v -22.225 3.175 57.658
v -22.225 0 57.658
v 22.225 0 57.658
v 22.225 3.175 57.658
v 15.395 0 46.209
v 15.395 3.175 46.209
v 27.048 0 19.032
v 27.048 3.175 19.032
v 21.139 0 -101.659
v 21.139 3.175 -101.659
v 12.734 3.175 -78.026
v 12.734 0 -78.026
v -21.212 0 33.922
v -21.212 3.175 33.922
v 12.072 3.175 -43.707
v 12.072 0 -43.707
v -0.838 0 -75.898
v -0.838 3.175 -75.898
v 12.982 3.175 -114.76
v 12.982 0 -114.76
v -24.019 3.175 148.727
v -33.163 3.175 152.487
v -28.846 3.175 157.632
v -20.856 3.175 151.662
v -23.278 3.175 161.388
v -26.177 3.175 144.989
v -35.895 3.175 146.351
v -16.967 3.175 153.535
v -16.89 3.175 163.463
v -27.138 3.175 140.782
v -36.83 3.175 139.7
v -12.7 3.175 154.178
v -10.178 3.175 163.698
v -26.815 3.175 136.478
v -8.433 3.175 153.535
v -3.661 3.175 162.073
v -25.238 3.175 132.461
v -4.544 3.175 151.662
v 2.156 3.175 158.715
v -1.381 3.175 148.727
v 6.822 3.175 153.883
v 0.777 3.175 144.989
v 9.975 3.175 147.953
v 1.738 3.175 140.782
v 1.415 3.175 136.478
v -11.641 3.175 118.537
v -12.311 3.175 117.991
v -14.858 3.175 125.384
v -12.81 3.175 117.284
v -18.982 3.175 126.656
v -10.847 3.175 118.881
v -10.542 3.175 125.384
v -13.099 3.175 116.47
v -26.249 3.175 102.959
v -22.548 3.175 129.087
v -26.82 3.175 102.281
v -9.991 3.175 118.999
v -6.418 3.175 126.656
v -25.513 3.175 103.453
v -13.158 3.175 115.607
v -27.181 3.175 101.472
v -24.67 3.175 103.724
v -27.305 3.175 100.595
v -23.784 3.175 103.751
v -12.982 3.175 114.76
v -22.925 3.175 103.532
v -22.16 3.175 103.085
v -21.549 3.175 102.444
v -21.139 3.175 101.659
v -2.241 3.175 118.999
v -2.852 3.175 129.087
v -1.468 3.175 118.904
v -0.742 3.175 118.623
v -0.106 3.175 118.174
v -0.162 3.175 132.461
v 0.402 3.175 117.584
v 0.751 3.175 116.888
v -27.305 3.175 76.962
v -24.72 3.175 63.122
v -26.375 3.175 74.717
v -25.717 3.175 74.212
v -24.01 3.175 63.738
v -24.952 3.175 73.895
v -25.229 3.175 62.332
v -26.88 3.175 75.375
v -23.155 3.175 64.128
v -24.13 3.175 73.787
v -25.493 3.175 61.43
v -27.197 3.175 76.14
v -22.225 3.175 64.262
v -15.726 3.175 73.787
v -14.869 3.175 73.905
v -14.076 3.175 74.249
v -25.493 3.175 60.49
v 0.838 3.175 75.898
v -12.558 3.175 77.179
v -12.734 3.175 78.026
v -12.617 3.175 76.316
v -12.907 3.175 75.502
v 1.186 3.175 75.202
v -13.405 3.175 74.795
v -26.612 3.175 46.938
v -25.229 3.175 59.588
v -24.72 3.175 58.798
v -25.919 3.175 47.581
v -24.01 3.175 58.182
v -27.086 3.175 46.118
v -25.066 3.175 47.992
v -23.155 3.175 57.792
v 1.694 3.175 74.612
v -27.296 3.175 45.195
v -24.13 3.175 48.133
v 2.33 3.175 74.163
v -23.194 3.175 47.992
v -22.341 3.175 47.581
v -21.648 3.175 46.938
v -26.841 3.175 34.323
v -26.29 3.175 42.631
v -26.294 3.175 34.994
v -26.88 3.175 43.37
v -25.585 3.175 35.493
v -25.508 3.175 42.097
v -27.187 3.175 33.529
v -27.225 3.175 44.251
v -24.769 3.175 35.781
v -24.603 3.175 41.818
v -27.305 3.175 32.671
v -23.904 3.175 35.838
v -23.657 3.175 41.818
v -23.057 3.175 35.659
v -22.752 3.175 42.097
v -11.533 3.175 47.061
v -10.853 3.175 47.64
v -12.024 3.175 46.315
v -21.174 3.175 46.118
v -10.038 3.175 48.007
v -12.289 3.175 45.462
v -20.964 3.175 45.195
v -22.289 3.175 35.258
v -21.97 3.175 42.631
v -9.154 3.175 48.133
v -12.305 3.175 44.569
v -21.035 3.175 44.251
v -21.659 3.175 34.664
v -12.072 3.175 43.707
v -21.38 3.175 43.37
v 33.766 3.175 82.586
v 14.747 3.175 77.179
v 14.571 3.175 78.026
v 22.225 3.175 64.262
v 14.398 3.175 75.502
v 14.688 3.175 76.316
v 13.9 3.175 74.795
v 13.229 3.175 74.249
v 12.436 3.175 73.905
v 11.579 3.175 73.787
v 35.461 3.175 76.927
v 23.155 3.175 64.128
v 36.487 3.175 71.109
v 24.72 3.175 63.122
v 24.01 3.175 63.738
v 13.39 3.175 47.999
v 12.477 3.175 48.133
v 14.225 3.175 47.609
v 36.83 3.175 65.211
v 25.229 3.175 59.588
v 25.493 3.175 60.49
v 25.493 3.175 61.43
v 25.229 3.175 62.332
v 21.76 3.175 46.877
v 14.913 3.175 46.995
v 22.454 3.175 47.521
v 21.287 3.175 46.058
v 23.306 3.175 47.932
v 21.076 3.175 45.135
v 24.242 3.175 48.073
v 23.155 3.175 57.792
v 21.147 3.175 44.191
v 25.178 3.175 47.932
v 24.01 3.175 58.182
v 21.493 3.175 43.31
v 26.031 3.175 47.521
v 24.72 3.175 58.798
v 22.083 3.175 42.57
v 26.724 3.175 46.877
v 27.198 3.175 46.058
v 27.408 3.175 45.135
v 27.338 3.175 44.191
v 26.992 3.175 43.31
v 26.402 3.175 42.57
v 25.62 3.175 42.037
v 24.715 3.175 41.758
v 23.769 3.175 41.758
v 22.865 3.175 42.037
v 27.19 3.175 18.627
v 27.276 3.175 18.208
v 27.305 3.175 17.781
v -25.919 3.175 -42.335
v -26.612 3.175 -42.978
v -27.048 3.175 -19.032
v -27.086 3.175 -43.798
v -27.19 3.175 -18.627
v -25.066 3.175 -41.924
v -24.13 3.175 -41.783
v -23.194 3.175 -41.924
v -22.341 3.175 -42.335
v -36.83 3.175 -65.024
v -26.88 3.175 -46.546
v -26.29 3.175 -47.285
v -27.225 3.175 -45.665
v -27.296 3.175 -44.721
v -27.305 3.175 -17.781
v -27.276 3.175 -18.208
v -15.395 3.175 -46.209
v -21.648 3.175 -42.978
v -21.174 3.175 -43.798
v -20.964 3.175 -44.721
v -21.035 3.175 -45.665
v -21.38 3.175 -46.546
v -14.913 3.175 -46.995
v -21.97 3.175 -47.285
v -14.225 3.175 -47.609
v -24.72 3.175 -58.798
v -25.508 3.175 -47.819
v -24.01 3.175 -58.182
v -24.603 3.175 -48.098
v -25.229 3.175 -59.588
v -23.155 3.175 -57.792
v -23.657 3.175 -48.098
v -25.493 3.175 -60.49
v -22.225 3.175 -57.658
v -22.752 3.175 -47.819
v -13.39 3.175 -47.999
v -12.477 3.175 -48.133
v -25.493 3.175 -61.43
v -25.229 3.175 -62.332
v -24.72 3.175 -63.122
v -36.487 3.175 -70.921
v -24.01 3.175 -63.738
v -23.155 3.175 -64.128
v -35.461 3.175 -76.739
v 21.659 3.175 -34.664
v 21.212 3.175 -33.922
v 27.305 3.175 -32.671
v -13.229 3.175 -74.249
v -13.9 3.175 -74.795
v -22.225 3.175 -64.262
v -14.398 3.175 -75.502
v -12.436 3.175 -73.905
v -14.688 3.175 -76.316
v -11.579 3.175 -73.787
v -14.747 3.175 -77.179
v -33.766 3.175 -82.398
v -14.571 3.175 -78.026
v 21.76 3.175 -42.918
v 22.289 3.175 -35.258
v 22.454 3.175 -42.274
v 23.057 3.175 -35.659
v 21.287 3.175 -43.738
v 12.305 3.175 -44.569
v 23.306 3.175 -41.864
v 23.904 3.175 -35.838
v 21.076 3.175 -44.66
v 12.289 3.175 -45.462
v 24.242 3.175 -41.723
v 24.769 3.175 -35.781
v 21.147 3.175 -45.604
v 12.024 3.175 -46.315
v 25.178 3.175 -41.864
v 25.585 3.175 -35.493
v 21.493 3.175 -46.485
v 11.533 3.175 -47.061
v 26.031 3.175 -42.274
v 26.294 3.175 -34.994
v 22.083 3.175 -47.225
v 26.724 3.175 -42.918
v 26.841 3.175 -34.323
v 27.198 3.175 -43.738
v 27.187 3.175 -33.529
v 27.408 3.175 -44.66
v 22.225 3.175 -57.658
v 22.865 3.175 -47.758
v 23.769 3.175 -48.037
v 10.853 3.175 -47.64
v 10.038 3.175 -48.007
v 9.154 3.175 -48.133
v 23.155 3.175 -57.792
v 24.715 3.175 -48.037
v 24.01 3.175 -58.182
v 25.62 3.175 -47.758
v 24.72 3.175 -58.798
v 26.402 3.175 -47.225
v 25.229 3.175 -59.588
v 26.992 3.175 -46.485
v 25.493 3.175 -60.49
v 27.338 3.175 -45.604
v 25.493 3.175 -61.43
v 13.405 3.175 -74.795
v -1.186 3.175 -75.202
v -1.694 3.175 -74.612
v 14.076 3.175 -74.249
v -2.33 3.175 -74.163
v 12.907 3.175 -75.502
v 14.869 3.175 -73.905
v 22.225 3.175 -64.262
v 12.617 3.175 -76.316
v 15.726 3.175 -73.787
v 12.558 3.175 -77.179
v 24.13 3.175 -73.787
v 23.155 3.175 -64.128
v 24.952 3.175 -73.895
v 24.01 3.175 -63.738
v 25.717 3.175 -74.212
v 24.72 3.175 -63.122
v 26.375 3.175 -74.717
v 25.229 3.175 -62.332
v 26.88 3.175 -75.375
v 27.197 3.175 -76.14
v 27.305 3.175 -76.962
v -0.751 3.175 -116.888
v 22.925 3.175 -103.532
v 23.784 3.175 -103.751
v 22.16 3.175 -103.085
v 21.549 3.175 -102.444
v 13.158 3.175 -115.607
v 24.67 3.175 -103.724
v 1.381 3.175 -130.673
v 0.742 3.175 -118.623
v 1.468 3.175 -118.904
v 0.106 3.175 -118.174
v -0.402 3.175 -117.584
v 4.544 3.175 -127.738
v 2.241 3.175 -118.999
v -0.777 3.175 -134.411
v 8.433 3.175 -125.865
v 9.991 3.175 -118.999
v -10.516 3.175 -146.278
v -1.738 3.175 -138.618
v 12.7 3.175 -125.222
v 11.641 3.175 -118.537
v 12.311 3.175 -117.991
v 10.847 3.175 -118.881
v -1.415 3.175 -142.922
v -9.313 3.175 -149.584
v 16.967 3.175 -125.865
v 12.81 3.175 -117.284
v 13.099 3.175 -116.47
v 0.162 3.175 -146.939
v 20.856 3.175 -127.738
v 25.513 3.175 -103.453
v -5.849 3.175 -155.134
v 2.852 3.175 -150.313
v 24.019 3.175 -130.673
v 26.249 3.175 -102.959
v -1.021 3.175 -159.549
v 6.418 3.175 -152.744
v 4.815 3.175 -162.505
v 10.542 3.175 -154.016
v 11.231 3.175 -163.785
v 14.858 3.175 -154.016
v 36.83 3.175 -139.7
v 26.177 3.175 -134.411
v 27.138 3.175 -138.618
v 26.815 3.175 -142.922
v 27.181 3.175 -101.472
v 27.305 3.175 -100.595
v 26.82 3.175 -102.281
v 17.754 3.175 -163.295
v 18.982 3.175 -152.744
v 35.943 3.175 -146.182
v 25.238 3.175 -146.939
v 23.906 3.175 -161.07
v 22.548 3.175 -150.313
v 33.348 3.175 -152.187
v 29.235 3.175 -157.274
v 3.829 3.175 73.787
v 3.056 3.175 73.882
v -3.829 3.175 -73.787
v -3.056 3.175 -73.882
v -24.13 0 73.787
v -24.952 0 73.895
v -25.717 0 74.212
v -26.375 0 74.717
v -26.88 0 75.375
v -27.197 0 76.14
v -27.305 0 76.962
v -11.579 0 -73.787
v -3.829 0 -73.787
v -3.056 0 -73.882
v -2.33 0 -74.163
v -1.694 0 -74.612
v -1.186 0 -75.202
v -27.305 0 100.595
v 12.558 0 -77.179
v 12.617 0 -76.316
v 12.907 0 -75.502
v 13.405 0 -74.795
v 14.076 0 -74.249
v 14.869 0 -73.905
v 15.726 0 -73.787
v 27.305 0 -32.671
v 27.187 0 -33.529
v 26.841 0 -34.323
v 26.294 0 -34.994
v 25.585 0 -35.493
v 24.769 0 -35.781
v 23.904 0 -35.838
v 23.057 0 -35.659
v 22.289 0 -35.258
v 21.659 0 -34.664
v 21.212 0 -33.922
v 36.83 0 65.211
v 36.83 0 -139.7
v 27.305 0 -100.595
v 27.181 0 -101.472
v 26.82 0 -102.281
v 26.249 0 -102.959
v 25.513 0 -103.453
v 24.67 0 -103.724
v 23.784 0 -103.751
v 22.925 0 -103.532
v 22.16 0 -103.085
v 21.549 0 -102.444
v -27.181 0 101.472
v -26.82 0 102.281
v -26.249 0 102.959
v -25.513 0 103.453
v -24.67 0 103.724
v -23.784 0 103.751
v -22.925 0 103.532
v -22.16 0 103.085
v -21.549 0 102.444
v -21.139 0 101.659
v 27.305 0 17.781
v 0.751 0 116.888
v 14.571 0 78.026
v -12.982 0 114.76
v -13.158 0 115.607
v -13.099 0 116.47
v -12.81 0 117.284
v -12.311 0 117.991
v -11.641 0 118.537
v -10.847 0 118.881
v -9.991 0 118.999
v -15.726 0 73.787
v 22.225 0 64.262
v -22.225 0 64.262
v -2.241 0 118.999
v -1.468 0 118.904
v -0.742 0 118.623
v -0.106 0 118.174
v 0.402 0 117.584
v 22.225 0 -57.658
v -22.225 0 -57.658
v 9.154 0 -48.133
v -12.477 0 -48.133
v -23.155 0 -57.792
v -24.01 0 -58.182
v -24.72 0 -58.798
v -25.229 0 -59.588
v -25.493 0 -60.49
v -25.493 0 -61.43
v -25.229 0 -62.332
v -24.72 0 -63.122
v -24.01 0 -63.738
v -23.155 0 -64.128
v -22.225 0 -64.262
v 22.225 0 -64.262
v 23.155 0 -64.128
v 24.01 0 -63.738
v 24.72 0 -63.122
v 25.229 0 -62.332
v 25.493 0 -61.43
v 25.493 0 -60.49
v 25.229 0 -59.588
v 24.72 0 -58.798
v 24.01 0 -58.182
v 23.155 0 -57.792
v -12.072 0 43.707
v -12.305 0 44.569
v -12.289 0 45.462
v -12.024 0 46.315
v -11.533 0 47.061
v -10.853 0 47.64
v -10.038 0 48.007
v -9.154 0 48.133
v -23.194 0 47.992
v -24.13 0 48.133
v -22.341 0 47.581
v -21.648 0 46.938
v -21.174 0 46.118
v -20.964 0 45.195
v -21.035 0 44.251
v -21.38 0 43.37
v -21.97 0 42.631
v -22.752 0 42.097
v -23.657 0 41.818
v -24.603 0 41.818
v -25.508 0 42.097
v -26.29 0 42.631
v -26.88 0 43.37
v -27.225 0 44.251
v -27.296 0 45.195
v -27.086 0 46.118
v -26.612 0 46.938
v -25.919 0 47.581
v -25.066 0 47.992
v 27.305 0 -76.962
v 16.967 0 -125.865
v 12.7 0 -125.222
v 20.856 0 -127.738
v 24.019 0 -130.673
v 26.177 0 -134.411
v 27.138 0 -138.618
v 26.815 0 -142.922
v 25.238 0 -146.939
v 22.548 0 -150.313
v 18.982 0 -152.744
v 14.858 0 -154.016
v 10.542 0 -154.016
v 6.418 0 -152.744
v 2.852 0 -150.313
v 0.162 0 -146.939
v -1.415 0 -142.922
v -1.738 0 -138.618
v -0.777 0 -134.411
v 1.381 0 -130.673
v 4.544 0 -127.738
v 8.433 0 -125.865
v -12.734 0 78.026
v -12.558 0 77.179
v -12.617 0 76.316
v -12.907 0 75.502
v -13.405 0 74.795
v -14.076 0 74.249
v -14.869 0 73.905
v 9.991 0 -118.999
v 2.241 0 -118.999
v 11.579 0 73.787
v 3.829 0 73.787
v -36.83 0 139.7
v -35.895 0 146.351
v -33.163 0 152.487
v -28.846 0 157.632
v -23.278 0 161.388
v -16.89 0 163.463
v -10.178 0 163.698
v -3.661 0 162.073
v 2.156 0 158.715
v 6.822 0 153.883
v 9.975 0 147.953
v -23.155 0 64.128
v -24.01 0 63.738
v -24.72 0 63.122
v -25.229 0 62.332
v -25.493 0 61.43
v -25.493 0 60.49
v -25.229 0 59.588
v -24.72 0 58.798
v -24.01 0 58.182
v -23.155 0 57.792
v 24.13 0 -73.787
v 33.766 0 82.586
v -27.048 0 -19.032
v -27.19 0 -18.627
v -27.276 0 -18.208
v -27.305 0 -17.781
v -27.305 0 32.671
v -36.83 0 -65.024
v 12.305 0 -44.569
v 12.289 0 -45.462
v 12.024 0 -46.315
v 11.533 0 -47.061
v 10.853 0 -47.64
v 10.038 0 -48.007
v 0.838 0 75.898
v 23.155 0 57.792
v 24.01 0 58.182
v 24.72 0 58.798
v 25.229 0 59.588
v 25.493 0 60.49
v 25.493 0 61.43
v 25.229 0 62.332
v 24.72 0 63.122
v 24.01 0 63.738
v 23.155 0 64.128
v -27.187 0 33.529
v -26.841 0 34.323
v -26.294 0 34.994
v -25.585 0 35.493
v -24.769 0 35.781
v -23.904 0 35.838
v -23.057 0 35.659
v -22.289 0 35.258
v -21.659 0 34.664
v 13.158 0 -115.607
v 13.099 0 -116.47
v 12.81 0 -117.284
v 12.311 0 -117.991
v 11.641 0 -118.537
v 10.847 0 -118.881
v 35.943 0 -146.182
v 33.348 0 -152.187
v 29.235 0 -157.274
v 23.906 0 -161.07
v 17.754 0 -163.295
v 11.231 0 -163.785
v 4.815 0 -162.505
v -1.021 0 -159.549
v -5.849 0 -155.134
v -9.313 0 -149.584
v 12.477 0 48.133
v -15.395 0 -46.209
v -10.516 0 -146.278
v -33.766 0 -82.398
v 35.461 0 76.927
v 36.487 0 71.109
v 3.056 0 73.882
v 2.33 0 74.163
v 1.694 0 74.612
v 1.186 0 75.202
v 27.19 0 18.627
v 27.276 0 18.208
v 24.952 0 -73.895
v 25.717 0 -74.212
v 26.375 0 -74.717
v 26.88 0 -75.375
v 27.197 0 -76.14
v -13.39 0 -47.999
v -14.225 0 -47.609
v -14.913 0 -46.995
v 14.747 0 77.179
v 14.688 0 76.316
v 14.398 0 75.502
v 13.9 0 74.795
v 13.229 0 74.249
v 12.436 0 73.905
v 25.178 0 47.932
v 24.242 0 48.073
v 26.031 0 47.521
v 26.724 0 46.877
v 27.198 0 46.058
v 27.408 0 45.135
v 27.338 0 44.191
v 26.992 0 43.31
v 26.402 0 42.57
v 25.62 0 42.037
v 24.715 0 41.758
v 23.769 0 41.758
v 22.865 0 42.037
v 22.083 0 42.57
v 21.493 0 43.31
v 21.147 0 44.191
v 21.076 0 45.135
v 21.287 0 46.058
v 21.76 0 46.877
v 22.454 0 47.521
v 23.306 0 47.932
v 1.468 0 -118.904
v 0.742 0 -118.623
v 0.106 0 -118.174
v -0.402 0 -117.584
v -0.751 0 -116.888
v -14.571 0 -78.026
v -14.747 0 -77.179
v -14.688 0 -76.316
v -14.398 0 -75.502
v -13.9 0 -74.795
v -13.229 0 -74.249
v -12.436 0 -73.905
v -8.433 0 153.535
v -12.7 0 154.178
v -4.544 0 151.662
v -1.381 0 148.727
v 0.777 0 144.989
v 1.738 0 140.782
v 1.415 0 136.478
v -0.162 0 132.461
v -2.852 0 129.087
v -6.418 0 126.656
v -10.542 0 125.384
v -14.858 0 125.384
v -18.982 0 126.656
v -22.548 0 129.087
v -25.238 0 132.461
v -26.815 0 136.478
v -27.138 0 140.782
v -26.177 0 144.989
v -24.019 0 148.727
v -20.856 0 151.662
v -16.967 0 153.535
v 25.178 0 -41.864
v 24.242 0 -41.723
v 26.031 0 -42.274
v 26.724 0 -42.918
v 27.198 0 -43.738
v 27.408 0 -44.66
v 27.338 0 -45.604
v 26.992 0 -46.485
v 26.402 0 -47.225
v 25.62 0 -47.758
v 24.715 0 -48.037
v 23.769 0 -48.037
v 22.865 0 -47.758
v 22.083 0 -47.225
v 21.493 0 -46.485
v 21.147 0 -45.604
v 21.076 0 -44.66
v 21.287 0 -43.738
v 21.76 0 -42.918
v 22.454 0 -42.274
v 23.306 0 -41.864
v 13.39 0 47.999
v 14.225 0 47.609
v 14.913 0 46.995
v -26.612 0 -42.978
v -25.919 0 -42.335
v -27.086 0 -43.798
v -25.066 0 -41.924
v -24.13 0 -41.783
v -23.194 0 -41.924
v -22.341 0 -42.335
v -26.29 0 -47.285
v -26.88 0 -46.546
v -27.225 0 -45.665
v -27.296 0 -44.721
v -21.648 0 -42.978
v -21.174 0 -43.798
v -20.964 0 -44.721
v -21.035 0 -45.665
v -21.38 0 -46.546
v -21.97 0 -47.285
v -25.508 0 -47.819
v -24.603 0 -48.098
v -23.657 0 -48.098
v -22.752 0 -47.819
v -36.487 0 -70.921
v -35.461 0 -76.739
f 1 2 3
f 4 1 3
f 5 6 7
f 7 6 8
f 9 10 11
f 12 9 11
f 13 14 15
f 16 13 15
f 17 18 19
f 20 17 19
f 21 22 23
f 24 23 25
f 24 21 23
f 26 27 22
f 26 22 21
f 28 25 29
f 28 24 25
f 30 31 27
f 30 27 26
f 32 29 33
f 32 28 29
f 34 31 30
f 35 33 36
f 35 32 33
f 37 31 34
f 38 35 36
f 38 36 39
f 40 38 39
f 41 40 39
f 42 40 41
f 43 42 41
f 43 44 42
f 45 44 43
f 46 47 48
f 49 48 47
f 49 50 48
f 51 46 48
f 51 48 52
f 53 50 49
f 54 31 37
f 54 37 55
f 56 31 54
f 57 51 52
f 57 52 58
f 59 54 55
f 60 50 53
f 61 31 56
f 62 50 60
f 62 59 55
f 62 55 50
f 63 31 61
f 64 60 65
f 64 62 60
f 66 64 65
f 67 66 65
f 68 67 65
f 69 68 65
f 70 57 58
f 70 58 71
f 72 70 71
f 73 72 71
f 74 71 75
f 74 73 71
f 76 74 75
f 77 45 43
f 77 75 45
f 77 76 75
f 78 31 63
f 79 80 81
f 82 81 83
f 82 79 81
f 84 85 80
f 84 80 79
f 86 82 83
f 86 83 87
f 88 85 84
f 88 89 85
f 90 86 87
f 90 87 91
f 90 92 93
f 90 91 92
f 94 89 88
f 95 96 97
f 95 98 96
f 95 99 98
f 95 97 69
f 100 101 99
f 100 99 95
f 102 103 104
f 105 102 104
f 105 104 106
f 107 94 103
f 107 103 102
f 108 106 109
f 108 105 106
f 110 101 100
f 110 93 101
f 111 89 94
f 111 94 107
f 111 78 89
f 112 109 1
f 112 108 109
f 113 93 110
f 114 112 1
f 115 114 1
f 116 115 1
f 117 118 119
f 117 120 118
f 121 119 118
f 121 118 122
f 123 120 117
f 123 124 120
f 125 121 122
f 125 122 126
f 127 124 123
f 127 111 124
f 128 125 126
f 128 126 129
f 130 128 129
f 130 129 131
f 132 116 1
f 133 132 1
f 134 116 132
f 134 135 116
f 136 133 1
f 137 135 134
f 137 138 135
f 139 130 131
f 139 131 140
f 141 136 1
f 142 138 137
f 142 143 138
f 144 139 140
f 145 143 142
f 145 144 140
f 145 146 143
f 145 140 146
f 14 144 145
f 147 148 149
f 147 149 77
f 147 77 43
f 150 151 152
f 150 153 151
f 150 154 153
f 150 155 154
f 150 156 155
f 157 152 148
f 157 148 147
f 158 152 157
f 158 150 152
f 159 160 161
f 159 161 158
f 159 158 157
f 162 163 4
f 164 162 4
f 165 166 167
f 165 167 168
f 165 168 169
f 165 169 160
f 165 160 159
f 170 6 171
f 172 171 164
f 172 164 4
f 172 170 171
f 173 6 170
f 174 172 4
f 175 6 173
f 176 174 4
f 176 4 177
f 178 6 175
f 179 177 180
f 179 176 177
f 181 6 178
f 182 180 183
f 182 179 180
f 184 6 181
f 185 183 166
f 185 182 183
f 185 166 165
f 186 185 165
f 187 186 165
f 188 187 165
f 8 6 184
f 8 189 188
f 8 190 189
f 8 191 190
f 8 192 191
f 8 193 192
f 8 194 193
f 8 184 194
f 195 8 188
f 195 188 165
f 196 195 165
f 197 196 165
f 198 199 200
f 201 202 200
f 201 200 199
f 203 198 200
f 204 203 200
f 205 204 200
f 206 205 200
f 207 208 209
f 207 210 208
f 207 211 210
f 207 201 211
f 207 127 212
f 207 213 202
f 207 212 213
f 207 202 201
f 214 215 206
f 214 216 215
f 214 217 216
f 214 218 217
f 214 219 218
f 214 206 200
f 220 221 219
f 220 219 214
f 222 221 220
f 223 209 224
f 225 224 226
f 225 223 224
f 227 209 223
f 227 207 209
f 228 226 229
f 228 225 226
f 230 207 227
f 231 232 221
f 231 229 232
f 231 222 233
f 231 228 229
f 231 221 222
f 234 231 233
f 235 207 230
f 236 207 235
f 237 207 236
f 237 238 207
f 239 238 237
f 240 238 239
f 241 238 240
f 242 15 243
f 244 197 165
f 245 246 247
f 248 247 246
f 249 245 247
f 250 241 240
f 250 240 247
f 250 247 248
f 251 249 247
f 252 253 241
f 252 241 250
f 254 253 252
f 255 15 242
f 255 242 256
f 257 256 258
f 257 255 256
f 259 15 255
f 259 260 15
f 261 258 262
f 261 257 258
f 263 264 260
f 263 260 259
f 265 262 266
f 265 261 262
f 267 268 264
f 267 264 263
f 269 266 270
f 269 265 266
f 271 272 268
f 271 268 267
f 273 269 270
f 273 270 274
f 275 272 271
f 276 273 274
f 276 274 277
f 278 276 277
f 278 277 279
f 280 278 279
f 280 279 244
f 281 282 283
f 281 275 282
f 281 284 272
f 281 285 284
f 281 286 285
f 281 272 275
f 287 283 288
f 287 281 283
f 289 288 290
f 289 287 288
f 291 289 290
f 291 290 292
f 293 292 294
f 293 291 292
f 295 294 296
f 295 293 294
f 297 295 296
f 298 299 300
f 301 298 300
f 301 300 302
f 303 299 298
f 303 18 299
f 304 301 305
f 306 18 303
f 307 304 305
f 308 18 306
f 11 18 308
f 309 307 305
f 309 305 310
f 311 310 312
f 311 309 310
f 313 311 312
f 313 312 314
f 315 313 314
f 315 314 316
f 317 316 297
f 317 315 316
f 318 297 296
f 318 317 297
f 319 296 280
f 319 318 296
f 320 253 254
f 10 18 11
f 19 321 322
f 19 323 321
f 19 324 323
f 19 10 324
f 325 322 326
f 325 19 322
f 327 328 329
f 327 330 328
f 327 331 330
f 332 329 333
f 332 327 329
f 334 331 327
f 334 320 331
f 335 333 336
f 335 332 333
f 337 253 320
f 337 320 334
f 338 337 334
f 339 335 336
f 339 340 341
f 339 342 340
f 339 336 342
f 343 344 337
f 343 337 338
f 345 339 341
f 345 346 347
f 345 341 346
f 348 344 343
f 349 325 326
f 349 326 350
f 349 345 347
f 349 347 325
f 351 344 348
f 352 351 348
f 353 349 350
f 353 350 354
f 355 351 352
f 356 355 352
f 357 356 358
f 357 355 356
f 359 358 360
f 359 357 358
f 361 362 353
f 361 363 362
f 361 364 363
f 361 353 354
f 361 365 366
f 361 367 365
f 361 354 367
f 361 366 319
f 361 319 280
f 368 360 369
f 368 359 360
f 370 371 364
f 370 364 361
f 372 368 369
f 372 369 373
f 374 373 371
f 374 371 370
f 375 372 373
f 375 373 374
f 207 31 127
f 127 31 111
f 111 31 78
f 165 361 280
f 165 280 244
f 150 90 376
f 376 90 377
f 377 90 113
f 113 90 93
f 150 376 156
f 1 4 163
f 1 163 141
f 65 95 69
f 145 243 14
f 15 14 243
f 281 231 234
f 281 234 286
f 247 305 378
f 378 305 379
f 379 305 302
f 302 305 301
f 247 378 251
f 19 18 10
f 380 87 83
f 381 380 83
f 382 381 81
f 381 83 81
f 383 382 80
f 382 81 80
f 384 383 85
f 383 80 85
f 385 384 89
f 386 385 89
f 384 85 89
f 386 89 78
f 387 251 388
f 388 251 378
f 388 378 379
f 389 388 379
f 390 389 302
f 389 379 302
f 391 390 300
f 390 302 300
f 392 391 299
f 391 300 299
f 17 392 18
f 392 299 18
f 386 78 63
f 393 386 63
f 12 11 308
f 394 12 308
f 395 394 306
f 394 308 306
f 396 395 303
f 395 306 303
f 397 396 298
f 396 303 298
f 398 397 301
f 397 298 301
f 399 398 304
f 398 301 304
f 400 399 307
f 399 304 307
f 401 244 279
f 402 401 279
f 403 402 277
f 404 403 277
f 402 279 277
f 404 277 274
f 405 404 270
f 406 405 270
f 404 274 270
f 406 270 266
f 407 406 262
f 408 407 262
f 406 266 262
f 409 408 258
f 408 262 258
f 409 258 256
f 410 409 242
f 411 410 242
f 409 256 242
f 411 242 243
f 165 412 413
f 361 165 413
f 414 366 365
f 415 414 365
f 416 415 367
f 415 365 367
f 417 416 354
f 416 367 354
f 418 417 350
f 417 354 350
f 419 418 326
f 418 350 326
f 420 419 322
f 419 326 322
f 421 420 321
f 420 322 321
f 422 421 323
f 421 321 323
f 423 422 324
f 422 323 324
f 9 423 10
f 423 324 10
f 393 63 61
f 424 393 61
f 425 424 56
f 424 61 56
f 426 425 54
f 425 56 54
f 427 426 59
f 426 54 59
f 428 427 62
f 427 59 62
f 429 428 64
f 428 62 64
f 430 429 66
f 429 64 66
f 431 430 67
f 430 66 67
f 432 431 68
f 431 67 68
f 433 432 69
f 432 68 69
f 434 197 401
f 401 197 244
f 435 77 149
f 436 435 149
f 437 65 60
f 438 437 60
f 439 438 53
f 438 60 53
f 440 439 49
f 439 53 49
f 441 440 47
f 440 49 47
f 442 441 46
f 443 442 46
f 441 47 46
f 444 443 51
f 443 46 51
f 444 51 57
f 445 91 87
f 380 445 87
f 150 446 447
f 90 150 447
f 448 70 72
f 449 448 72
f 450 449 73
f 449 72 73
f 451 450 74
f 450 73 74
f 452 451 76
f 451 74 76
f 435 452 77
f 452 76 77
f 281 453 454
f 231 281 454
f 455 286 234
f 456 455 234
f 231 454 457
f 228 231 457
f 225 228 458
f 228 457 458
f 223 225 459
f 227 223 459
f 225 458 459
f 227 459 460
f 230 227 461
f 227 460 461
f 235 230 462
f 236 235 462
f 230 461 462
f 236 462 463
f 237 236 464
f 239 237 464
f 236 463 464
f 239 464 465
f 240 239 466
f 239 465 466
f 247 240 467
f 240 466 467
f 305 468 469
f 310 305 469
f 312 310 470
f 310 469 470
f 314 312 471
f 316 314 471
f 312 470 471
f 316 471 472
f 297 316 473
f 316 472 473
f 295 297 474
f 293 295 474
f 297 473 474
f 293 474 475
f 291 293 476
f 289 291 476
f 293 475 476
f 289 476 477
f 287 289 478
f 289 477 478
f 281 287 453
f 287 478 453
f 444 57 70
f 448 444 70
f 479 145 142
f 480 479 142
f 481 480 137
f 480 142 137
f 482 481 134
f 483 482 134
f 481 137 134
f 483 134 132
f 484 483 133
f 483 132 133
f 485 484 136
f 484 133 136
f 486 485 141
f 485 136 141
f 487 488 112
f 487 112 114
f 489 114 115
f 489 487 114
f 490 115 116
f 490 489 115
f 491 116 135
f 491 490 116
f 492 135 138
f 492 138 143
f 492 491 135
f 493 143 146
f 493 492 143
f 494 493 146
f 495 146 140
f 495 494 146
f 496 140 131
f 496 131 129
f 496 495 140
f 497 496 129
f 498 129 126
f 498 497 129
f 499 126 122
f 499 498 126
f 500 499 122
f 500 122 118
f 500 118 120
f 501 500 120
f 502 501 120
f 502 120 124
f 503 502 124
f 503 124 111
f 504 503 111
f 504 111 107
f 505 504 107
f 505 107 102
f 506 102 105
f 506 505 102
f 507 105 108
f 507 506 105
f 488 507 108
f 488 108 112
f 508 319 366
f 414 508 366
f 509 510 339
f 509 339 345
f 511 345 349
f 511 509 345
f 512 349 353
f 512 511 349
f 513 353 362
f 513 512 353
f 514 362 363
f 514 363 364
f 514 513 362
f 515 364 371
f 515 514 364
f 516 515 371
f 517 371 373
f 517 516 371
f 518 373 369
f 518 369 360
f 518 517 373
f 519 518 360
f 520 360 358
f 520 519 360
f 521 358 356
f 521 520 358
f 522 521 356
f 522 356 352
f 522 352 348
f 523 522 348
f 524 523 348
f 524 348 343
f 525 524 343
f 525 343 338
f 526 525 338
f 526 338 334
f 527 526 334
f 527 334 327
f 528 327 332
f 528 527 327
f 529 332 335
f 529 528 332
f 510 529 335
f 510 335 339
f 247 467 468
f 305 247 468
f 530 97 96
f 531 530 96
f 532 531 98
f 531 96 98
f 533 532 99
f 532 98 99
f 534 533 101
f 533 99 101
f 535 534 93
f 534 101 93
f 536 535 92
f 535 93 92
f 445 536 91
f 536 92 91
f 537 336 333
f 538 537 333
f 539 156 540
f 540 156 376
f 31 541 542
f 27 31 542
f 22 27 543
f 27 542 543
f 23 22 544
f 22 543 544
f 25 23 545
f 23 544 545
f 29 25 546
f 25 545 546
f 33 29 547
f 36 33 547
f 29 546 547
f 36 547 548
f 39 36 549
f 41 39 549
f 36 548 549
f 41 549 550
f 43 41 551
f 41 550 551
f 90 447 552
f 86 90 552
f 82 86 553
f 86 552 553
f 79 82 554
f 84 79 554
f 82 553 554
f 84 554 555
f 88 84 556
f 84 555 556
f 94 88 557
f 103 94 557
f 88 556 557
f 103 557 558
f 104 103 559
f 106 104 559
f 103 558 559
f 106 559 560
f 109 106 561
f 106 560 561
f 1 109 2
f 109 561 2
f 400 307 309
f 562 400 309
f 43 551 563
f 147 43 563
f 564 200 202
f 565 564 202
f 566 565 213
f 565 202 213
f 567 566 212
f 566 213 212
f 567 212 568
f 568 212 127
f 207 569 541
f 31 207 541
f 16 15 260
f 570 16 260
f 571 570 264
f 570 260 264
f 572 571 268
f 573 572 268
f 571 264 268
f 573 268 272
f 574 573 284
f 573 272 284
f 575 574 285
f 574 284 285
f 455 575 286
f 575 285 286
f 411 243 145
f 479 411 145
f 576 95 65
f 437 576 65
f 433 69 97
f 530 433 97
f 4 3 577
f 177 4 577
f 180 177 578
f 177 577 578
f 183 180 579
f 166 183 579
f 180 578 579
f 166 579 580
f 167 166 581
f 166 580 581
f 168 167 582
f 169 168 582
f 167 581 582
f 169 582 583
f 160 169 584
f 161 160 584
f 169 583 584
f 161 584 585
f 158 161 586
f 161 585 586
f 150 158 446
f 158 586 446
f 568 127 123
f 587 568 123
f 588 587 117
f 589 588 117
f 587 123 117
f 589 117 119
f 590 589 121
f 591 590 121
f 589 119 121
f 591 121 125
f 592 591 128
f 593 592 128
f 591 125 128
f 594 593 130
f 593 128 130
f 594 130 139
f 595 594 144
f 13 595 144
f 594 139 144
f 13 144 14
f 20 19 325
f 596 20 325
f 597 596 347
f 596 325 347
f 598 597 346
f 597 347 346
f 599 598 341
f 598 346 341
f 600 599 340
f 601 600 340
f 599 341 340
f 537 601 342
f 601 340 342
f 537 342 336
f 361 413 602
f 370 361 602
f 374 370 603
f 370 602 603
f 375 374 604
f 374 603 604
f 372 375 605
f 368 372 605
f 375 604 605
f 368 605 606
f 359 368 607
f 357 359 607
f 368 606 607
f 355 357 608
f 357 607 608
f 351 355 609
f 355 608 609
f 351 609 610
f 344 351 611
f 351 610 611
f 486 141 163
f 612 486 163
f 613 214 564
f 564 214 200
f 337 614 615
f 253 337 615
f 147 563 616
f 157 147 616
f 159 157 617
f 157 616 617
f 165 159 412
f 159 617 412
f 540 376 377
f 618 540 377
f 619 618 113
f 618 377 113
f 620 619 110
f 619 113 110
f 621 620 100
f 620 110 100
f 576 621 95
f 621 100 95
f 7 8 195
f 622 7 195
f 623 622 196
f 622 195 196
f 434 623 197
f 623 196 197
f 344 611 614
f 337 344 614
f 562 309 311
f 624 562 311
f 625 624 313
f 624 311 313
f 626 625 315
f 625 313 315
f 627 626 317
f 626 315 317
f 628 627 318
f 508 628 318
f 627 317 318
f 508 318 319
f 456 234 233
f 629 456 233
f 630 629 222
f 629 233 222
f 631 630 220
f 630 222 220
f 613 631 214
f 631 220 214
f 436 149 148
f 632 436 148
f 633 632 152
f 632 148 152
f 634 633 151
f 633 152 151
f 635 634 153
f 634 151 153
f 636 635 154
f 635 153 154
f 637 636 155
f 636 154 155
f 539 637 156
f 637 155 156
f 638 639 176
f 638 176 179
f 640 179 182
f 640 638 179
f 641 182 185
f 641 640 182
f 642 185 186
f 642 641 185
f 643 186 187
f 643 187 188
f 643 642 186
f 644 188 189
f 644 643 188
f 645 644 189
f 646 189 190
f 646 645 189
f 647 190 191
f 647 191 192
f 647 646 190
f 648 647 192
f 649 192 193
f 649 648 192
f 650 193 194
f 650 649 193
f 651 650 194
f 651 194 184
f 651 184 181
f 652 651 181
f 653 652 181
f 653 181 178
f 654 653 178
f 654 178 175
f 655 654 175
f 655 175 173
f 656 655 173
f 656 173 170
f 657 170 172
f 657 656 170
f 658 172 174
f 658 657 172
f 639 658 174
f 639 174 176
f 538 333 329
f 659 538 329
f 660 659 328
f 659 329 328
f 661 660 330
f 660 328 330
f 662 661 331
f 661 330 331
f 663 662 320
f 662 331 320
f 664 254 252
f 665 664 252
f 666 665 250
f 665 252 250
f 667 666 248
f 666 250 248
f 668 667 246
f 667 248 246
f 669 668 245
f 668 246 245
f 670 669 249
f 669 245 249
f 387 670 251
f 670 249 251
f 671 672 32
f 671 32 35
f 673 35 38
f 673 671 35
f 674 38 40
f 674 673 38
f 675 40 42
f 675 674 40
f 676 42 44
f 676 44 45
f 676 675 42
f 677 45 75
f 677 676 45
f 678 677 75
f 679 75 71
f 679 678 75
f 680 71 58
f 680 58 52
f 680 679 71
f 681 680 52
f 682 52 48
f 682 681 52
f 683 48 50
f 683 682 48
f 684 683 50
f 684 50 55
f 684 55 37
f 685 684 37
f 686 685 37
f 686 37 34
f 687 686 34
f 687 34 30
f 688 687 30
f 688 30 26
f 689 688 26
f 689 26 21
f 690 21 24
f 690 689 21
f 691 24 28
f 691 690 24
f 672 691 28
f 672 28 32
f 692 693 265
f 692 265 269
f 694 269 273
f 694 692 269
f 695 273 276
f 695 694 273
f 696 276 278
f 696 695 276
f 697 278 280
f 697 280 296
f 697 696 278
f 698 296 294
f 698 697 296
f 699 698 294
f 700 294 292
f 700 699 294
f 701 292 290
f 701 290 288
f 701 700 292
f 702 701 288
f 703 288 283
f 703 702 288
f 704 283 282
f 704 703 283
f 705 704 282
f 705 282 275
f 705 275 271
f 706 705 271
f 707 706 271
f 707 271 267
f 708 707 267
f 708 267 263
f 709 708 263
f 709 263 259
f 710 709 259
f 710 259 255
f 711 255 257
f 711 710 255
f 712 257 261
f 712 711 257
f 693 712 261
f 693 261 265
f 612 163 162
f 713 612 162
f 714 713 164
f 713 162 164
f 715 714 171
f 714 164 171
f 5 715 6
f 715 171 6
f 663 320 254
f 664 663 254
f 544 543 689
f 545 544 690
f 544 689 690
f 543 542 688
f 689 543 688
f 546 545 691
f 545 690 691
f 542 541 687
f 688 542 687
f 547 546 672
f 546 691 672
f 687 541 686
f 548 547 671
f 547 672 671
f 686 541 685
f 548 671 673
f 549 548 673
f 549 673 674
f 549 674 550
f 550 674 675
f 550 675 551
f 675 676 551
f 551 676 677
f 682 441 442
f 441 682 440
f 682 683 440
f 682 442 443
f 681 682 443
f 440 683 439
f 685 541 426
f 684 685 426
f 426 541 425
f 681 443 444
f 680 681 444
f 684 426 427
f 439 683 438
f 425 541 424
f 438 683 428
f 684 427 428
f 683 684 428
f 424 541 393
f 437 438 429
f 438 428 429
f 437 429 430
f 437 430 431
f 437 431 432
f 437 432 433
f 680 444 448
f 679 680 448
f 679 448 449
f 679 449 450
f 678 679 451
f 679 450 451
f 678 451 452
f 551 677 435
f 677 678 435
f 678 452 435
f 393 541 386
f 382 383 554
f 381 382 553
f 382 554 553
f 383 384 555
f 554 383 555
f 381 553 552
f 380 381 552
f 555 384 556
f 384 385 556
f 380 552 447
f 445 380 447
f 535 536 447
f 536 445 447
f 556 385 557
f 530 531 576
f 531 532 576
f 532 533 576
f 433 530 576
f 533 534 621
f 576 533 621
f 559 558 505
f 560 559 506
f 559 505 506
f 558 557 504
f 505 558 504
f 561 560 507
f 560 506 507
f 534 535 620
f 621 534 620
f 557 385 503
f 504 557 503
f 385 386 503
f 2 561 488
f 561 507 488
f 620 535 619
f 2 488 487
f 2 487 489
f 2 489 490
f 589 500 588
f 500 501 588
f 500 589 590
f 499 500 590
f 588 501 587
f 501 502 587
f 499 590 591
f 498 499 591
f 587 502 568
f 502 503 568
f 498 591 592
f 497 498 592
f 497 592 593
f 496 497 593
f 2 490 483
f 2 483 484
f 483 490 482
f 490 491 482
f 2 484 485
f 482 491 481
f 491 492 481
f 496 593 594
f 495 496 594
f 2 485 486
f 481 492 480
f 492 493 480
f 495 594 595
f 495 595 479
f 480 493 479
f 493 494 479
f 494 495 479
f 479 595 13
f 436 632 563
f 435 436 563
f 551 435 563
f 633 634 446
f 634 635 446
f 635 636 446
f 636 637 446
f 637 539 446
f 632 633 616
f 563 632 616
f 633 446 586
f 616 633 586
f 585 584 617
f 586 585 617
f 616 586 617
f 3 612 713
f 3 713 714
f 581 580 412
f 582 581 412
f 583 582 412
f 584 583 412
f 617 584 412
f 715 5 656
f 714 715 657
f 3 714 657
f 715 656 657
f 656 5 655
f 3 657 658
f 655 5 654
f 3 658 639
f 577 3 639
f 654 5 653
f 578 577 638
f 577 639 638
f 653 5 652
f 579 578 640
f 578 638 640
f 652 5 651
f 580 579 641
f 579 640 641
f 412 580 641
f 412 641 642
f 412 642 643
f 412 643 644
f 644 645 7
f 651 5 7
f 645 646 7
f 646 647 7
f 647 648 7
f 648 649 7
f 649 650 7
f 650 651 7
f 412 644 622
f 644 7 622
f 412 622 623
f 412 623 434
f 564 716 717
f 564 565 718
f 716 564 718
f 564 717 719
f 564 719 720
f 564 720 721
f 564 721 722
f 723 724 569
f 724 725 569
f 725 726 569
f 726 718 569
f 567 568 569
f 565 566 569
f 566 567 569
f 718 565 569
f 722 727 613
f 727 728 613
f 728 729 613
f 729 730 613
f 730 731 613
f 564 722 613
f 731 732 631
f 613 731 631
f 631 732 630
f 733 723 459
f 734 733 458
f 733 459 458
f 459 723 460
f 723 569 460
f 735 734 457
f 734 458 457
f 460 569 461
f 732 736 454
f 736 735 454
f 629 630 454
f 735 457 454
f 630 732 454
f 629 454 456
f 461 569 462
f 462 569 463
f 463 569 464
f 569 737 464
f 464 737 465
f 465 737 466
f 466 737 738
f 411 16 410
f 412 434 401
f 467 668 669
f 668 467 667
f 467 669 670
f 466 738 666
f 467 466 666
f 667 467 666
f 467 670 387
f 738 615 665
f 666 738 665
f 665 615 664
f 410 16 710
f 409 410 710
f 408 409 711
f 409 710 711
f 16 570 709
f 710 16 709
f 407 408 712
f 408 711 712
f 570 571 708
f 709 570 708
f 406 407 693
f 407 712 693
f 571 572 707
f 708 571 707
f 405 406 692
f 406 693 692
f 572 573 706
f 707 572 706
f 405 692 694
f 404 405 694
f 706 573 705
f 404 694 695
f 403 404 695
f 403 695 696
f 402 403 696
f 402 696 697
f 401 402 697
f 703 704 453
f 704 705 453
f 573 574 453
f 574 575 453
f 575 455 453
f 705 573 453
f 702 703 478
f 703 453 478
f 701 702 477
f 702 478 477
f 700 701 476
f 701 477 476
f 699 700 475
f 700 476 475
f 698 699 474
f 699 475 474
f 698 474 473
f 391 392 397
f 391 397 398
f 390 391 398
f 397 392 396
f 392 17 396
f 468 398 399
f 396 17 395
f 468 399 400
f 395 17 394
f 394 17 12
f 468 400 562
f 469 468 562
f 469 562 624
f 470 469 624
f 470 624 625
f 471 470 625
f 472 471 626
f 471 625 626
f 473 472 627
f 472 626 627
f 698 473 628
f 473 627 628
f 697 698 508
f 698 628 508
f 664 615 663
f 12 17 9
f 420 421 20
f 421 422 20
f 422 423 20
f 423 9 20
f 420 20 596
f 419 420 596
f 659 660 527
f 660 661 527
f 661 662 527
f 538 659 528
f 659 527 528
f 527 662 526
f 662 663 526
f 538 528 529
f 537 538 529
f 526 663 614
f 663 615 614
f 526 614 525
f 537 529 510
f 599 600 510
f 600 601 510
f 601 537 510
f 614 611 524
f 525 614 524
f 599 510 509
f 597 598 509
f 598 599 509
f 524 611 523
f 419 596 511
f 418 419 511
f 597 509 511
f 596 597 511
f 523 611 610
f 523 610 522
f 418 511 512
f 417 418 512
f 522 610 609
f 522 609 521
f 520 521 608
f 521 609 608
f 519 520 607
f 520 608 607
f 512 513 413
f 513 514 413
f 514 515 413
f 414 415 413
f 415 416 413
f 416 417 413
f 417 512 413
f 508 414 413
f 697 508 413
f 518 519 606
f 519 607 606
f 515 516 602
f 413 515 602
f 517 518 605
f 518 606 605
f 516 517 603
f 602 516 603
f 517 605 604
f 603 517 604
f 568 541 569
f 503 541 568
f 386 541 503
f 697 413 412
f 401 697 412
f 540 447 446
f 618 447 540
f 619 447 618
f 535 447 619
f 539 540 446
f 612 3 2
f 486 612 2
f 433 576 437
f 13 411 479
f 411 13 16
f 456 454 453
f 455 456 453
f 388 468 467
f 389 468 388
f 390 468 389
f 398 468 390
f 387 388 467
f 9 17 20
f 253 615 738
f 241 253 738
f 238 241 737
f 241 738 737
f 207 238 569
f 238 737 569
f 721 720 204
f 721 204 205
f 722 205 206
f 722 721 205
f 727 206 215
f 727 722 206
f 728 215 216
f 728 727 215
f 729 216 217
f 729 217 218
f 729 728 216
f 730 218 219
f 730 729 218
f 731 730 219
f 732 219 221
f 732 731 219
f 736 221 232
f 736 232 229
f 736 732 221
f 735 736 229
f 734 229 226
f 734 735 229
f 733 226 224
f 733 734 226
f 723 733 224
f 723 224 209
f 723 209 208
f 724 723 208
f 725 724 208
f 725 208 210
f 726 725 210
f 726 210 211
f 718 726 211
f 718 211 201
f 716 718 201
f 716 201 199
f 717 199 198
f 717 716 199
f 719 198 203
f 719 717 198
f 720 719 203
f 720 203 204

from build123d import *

# Parameters (mm, degrees)
SKETCH1_R           = 14.478
SKETCH1_R_2         = 3.175
BOSS_EXTRUDE1_DEPTH = 3.175
CUT_EXTRUDE1_DEPTH  = 168.948797034


with BuildPart() as part:
    # Sketch1 → Boss-Extrude1 (new body)
    with BuildSketch(Plane(origin=(0, 0, 0), x_dir=(1, 0, 0), z_dir=(0, 1, 0))):
        with BuildLine():
            Line((-36.83, 65.023620999), (-36.83, -139.7))
            ThreePointArc((-36.83, -139.7), (-16.890130527, -163.46341108), (9.97478294, -147.952946058))
            Line((9.97478294, -147.952946058), (33.766385136, -82.586056251))
            ThreePointArc((33.766385136, -82.586056251), (36.058233853, -74.032760396), (36.83, -65.21143297))
            Line((36.83, -65.21143297), (36.83, 139.7))
            ThreePointArc((36.83, 139.7), (17.75430807, 163.29472123), (-9.312633231, 149.584375461))
            Line((-9.312633231, 149.584375461), (-10.51620944, 146.277577002))
            Line((-10.51620944, 146.277577002), (-33.766385136, 82.39824428))
            ThreePointArc((-33.766385136, 82.39824428), (-36.058233853, 73.844948425), (-36.83, 65.023620999))
        make_face()
        with Locations(Location((-12.7, -139.7, 0), (0, 0, 270))):
            Circle(SKETCH1_R, mode=Mode.SUBTRACT)
        with Locations(Location((-24.13, -44.958, 0), (0, 0, 270))):
            Circle(SKETCH1_R_2, mode=Mode.SUBTRACT)
        with BuildLine():
            Line((22.225, -64.262), (-22.225, -64.262))
            ThreePointArc((-22.225, -64.262), (-25.527, -60.96), (-22.225, -57.658))
            Line((-22.225, -57.658), (22.225, -57.658))
            ThreePointArc((22.225, -57.658), (25.527, -60.96), (22.225, -64.262))
        make_face(mode=Mode.SUBTRACT)
        with Locations(Location((24.242138156, -44.897632473, 0), (0, 0, 270))):
            Circle(SKETCH1_R_2, mode=Mode.SUBTRACT)
        with Locations(Location((-24.13, 44.958, 0), (0, 0, 270))):
            Circle(SKETCH1_R_2, mode=Mode.SUBTRACT)
        with BuildLine():
            ThreePointArc((-22.225, 57.658), (-25.527, 60.96), (-22.225, 64.262))
            Line((-22.225, 64.262), (22.225, 64.262))
            ThreePointArc((22.225, 64.262), (25.527, 60.96), (22.225, 57.658))
            Line((22.225, 57.658), (-22.225, 57.658))
        make_face(mode=Mode.SUBTRACT)
        with Locations(Location((24.242138156, 44.897632473, 0), (0, 0, 270))):
            Circle(SKETCH1_R_2, mode=Mode.SUBTRACT)
        with Locations(Location((12.7, 139.7, 0), (0, 0, 270))):
            Circle(SKETCH1_R, mode=Mode.SUBTRACT)
    extrude(amount=BOSS_EXTRUDE1_DEPTH)

    # Sketch2 → Cut-Extrude1 (cut, through all)
    with BuildSketch(Plane(origin=(0, 3.175, 0), x_dir=(1, 0, 0), z_dir=(0, 1, 0))):
        with BuildLine():
            Line((-27.305, 17.780518249), (-27.305, -32.670889551))
            ThreePointArc((-27.305, -32.670889551), (-24.768631727, -35.780997992), (-21.21191369, -33.922047929))
            Line((-21.21191369, -33.922047929), (12.072240801, 43.706841622))
            ThreePointArc((12.072240801, 43.706841622), (11.804914085, 46.705597944), (9.154154491, 48.133))
            Line((9.154154491, 48.133), (-12.477385793, 48.133))
            ThreePointArc((-12.477385793, 48.133), (-14.224983737, 47.608759594), (-15.395472103, 46.209158378))
            Line((-15.395472103, 46.209158378), (-27.04808631, 19.031676627))
            ThreePointArc((-27.04808631, 19.031676627), (-27.240108441, 18.419149976), (-27.305, 17.780518249))
        make_face()
        with BuildLine():
            Line((27.305, -17.780518249), (27.305, 32.670889551))
            ThreePointArc((27.305, 32.670889551), (24.768631727, 35.780997992), (21.21191369, 33.922047929))
            Line((21.21191369, 33.922047929), (-12.072240801, -43.706841622))
            ThreePointArc((-12.072240801, -43.706841622), (-11.804914085, -46.705597944), (-9.154154491, -48.133))
            Line((-9.154154491, -48.133), (12.477385793, -48.133))
            ThreePointArc((12.477385793, -48.133), (14.224983737, -47.608759594), (15.395472103, -46.209158378))
            Line((15.395472103, -46.209158378), (27.04808631, -19.031676627))
            ThreePointArc((27.04808631, -19.031676627), (27.240108441, -18.419149976), (27.305, -17.780518249))
        make_face()
        with BuildLine():
            Line((-15.725871274, -73.787), (-24.13, -73.787))
            ThreePointArc((-24.13, -73.787), (-26.37506403, -74.71693597), (-27.305, -76.962))
            Line((-27.305, -76.962), (-27.305, -100.594783353))
            ThreePointArc((-27.305, -100.594783353), (-24.669761403, -103.723566283), (-21.138522754, -101.658592024))
            Line((-21.138522754, -101.658592024), (-12.734394028, -78.025808671))
            ThreePointArc((-12.734394028, -78.025808671), (-13.131818698, -75.131285321), (-15.725871274, -73.787))
        make_face()
        with BuildLine():
            Line((-9.990759398, -118.999), (-2.24070983, -118.999))
            ThreePointArc((-2.24070983, -118.999), (-0.409995151, -118.418052576), (0.750767416, -116.887808671))
            Line((0.750767416, -116.887808671), (14.570605972, -78.025808671))
            ThreePointArc((14.570605972, -78.025808671), (14.173181302, -75.131285321), (11.579128726, -73.787))
            Line((11.579128726, -73.787), (3.829079157, -73.787))
            ThreePointArc((3.829079157, -73.787), (1.998364479, -74.367947424), (0.837601912, -75.898191329))
            Line((0.837601912, -75.898191329), (-12.982236644, -114.760191329))
            ThreePointArc((-12.982236644, -114.760191329), (-12.584811974, -117.654714679), (-9.990759398, -118.999))
        make_face()
        with BuildLine():
            Line((15.725871274, 73.787), (24.13, 73.787))
            ThreePointArc((24.13, 73.787), (26.37506403, 74.71693597), (27.305, 76.962))
            Line((27.305, 76.962), (27.305, 100.594783353))
            ThreePointArc((27.305, 100.594783353), (24.669761403, 103.723566283), (21.138522754, 101.658592024))
            Line((21.138522754, 101.658592024), (12.734394028, 78.025808671))
            ThreePointArc((12.734394028, 78.025808671), (13.131818698, 75.131285321), (15.725871274, 73.787))
        make_face()
        with BuildLine():
            Line((9.990759398, 118.999), (2.24070983, 118.999))
            ThreePointArc((2.24070983, 118.999), (0.409995151, 118.418052576), (-0.750767416, 116.887808671))
            Line((-0.750767416, 116.887808671), (-14.570605972, 78.025808671))
            ThreePointArc((-14.570605972, 78.025808671), (-14.173181302, 75.131285321), (-11.579128726, 73.787))
            Line((-11.579128726, 73.787), (-3.829079157, 73.787))
            ThreePointArc((-3.829079157, 73.787), (-1.998364479, 74.367947424), (-0.837601912, 75.898191329))
            Line((-0.837601912, 75.898191329), (12.982236644, 114.760191329))
            ThreePointArc((12.982236644, 114.760191329), (12.584811974, 117.654714679), (9.990759398, 118.999))
        make_face()
    extrude(amount=-CUT_EXTRUDE1_DEPTH, mode=Mode.SUBTRACT)


solid = part.part
